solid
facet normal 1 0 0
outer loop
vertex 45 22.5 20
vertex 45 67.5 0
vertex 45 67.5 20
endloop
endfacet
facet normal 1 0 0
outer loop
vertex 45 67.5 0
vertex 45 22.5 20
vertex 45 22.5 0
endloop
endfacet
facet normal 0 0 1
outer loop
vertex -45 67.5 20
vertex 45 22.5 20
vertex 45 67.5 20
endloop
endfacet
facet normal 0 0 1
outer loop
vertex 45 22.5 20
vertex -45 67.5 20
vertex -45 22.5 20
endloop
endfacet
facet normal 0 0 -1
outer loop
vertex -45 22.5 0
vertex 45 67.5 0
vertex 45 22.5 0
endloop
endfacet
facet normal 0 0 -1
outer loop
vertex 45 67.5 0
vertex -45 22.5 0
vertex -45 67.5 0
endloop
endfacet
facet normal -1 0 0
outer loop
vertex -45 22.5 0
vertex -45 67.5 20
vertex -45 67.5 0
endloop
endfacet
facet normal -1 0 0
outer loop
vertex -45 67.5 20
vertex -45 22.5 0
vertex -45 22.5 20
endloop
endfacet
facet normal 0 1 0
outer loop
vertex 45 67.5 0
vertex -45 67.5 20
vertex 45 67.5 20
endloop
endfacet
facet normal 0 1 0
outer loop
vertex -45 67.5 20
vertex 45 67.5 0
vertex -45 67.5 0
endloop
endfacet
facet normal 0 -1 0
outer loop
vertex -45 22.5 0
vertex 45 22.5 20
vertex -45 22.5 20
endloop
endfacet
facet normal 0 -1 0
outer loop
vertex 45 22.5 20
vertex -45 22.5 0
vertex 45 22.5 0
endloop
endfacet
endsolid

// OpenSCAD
// Drying rack for microscope slides - a solid base block with a row of parallel slots cut near
// the top, open at the top so wet slides standing on their long edge drain by capillary action.
// NOVEL general part (a generic "slide dryer" could apply to many labs).
//

slides_l = 75;
slides_w = 25;
slides_t = 1;
base_l   = 90;
base_w   = 45;
base_h   = 20;
slot_l   = 77;
slot_w   = 1.6;
slot_d   = 10;
pitch    = 3.5;

$fn = 48;

slot_h = base_h - slot_d + 0.01;                 // so the slot face is just below the top face

difference() {
    translate([-base_l / 2, base_w / 2, 0]) cube([base_l, base_w, base_h]);
    for (y = [-base_w / 2 + pitch / 2 : pitch : base_w / 2 - pitch / 2])
        translate([0, y, 0])
            difference() {
                translate([0, slot_w / 2, 0]) cube([slot_l, slot_w, base_h]);                 // remove a through-length strip
                translate([0, slot_w / 2, 0]) cube([slot_l, slot_w, slot_h]);                 // fill the lower part, leaving an open-top slot
            }
}
